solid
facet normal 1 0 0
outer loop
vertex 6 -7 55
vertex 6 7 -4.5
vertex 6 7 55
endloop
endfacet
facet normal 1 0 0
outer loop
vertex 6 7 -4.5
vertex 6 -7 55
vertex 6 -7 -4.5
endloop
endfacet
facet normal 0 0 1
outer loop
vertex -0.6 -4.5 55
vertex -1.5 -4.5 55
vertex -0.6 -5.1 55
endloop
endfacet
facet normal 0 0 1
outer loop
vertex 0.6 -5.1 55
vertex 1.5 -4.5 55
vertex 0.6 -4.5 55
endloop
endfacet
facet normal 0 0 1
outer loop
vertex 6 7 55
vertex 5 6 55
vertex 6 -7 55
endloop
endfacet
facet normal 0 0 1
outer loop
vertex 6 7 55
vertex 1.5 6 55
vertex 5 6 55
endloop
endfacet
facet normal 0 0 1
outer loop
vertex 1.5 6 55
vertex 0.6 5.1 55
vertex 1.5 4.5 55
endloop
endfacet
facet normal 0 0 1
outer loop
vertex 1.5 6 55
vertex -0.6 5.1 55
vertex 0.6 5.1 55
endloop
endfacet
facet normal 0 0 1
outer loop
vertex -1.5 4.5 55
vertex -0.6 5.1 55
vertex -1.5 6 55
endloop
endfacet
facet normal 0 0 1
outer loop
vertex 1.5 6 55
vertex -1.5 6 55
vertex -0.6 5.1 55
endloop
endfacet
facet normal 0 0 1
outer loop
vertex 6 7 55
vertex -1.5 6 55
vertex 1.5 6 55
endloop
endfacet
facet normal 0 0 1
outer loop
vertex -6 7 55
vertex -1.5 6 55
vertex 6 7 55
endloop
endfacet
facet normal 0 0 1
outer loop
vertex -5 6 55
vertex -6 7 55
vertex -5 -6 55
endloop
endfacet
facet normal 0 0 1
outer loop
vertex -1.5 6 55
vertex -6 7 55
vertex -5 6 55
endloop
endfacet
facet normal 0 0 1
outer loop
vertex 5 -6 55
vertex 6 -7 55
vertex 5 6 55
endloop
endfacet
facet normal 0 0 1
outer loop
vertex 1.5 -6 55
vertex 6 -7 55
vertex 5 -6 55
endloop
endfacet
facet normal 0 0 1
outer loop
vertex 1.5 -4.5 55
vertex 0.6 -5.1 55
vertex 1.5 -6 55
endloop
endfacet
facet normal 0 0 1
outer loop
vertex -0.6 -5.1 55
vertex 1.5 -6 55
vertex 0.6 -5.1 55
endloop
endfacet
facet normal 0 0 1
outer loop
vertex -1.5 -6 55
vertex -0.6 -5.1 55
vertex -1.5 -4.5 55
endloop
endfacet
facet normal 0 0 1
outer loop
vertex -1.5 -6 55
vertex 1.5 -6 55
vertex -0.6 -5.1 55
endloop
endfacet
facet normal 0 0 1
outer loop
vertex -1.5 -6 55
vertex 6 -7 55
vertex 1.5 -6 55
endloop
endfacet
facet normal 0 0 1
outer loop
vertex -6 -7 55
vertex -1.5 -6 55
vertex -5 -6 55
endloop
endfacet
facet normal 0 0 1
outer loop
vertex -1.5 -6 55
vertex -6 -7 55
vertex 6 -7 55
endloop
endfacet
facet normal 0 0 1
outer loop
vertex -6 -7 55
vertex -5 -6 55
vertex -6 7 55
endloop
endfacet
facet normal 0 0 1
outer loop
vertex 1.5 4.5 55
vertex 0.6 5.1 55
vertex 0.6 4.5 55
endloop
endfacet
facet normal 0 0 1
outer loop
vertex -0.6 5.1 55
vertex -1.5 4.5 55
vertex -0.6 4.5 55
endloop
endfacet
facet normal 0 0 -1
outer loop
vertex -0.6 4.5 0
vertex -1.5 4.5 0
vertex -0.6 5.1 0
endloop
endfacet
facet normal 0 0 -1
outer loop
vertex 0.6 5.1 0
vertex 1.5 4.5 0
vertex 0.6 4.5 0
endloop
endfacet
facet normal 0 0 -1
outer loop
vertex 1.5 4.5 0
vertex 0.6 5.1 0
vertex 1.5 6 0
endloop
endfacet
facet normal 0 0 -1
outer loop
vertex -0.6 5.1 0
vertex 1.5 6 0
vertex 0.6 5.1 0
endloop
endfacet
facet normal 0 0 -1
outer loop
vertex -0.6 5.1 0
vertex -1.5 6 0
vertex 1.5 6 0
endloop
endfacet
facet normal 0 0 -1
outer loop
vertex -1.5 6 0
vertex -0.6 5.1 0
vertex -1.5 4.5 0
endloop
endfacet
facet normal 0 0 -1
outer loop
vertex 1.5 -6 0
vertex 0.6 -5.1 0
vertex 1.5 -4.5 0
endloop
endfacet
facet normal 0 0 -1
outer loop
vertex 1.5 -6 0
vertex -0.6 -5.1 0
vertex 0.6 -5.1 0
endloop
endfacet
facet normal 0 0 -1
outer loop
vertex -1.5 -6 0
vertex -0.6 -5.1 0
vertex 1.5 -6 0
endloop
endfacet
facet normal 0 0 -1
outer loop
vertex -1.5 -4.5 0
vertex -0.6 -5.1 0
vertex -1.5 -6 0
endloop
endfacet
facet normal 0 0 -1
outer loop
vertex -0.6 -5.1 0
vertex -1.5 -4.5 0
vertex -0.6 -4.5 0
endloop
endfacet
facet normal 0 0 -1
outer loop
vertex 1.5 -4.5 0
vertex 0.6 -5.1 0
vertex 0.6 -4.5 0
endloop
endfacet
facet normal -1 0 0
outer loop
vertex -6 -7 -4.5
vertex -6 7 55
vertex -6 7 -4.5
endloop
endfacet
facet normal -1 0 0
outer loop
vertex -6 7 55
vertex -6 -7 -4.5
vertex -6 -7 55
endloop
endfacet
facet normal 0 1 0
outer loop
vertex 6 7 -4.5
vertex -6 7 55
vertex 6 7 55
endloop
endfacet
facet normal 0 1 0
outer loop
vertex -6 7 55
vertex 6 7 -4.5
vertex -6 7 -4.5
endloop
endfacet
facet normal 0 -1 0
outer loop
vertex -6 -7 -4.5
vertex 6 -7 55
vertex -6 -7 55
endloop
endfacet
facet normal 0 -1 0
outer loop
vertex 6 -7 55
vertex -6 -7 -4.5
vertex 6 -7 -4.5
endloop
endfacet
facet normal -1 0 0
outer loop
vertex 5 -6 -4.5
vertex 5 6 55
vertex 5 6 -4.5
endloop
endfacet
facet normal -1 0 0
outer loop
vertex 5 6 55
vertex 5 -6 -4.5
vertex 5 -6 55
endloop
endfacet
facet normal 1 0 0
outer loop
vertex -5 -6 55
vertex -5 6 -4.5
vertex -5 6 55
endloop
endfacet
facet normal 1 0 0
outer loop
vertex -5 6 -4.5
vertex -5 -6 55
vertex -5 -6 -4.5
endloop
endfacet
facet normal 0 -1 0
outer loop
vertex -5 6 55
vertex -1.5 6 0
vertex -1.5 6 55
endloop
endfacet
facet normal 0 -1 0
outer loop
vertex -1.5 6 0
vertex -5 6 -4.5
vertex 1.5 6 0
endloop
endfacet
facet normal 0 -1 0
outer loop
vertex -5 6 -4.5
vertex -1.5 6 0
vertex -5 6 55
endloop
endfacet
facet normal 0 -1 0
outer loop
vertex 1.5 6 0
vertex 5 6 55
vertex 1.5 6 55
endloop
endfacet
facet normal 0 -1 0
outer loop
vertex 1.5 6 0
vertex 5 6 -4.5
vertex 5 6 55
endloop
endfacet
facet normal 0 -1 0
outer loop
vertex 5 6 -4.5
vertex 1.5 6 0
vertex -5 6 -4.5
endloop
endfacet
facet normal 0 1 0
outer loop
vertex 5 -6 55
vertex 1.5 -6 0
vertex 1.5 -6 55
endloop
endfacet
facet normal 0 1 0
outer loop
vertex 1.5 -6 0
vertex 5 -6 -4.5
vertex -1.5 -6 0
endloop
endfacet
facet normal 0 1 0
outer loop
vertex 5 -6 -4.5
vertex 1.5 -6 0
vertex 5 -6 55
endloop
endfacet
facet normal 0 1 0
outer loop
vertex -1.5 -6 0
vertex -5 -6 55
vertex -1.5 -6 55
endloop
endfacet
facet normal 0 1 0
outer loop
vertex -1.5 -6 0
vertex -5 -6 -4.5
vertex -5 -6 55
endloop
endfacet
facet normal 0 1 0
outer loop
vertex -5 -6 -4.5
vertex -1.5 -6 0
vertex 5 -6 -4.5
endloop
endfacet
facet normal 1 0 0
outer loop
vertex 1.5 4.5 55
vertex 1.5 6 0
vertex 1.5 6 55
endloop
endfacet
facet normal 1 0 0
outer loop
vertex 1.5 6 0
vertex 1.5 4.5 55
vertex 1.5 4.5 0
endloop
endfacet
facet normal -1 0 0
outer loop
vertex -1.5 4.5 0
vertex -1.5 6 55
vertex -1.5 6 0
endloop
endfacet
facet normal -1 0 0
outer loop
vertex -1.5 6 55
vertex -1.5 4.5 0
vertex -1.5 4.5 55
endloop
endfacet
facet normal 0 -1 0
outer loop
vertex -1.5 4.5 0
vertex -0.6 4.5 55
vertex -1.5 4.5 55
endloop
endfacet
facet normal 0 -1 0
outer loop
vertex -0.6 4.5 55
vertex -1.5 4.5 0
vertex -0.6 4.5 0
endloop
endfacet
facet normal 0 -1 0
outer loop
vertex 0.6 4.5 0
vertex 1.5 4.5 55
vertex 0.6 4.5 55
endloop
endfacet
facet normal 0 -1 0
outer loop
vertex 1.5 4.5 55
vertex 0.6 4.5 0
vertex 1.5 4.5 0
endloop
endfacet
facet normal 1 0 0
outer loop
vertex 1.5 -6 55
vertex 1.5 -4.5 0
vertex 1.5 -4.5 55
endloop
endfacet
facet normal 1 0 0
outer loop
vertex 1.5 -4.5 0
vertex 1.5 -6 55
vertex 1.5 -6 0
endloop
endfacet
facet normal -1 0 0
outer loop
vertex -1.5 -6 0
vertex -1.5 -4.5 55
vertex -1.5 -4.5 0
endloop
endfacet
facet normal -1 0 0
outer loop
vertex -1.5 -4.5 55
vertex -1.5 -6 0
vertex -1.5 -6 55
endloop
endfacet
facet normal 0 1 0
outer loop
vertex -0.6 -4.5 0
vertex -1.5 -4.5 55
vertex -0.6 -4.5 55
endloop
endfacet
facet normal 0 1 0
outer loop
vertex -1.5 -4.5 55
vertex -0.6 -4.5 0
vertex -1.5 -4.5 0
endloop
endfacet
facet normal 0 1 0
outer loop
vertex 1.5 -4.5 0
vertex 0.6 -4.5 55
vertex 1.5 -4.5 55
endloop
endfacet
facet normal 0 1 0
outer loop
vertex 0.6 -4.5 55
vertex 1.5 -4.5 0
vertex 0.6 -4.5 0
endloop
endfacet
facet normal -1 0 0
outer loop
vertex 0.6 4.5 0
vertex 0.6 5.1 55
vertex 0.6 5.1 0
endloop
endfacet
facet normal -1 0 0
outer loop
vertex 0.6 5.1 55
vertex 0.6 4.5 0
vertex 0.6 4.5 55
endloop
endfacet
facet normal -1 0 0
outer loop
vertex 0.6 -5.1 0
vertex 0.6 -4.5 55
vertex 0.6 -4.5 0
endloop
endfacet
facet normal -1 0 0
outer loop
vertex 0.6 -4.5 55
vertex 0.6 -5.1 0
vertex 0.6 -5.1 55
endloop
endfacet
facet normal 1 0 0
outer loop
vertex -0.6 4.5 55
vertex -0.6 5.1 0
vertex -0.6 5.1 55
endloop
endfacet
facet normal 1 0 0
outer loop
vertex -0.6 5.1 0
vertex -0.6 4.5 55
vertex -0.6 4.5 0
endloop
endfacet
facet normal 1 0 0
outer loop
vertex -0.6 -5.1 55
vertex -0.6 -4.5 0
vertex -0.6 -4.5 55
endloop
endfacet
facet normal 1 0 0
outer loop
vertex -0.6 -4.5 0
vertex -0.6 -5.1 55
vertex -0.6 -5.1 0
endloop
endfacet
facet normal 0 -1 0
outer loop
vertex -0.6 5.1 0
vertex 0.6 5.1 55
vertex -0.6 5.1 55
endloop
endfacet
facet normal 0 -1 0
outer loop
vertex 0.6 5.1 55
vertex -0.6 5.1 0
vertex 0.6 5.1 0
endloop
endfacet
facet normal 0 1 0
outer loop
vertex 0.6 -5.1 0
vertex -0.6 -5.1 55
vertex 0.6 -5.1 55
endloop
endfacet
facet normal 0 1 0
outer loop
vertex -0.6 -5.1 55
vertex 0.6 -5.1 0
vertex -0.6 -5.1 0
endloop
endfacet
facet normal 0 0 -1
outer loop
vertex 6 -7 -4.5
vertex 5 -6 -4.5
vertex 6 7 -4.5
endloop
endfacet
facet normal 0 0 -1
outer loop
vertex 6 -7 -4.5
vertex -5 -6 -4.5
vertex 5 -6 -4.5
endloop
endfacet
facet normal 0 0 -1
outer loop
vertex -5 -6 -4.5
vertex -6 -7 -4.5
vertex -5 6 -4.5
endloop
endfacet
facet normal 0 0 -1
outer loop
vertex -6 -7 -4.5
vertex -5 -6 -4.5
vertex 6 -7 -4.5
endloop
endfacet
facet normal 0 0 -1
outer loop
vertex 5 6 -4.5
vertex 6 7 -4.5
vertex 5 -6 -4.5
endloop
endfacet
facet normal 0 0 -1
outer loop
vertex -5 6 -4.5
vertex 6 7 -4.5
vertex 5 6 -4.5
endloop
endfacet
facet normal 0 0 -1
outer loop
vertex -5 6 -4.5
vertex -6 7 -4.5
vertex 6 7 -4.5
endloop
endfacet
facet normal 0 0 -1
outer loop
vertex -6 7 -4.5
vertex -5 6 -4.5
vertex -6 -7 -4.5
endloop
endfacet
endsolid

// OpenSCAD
// file: m3?_nut_clamp.scad
use <MCAD/regular_shapes.scad>
diam = 5.5;
achieved_diam = 5.05;
pad = (diam - achieved_diam) / 2;
r = diam/sqrt(3) + pad;

thread_diam = 2.90;
thread_pad = (0.1 + 2.85 - 2.46)/2;
t = 1;

module nut_clamp(h=3){
    linear_extrude(height=h){
        difference(){
            circle(r=r + t, $fn=6);
            circle(r=r, $fn=6);
        }
    }
}

module thread_tube(height=20, gap=0.0, $fn=20){
    cylinder_tube(height, thread_diam/2 + t + thread_pad + gap, t);
}

//thread_tube($fn=20);
// main file
include <m3?_nut_clamp.scad>

h = 55;
t = 1;
wing = 5; //11.92/2;
nut_h = 3;

module shaft(){
    nut_clamp(h=nut_h);
    translate([0, 0, 3])
    thread_tube(height=1, t=2);
    translate([0, 0, 4])
    thread_tube(height=1, t=1.5);
    translate([0, 0, 5])
    thread_tube(height=h - 5, t=1);
}

module shaft_hull(){
    hull(){
        nut_clamp(h=nut_h);
    }
    hull(){
        thread_tube(height=h, t=1);
    }
}

module winged_shaft(){
    difference(){
        translate([0, 0, h/2])
        cube([t, wing*2, h], center=true);
        shaft_hull();
    }
    shaft();
}

box_z = 9;
box_y = 12;
module box_grip(box_x=10, box_y=box_y, box_z=box_z, t=2){
    translate([0, 0, box_z/2])
    difference(){
        cube([box_x + t, box_y + t, box_z], center=true);
        cube([box_x, box_y, box_z], center=true);
    }
}

overhang = 0.5;
module wing_hold(z=h, gap=0.1){
    box_grip(box_z=z);
    w = t + box_y/2 - wing + overhang;
    translate([0, 0, z/2])
    difference(){
        union(){
            translate([0, t + (box_y - w)/2, 0])
            cube([3*t, w, z], center=true);
            translate([0, -t - (box_y - w)/2, 0])
            cube([3*t, w, z], center=true);
        }
        cube([t + 2 * gap, (wing + gap) * 2, 100], center=true);
    }
}

//winged_shaft();

wing_hold(z=h);
translate([0, 0, -box_z/2])
box_grip();
